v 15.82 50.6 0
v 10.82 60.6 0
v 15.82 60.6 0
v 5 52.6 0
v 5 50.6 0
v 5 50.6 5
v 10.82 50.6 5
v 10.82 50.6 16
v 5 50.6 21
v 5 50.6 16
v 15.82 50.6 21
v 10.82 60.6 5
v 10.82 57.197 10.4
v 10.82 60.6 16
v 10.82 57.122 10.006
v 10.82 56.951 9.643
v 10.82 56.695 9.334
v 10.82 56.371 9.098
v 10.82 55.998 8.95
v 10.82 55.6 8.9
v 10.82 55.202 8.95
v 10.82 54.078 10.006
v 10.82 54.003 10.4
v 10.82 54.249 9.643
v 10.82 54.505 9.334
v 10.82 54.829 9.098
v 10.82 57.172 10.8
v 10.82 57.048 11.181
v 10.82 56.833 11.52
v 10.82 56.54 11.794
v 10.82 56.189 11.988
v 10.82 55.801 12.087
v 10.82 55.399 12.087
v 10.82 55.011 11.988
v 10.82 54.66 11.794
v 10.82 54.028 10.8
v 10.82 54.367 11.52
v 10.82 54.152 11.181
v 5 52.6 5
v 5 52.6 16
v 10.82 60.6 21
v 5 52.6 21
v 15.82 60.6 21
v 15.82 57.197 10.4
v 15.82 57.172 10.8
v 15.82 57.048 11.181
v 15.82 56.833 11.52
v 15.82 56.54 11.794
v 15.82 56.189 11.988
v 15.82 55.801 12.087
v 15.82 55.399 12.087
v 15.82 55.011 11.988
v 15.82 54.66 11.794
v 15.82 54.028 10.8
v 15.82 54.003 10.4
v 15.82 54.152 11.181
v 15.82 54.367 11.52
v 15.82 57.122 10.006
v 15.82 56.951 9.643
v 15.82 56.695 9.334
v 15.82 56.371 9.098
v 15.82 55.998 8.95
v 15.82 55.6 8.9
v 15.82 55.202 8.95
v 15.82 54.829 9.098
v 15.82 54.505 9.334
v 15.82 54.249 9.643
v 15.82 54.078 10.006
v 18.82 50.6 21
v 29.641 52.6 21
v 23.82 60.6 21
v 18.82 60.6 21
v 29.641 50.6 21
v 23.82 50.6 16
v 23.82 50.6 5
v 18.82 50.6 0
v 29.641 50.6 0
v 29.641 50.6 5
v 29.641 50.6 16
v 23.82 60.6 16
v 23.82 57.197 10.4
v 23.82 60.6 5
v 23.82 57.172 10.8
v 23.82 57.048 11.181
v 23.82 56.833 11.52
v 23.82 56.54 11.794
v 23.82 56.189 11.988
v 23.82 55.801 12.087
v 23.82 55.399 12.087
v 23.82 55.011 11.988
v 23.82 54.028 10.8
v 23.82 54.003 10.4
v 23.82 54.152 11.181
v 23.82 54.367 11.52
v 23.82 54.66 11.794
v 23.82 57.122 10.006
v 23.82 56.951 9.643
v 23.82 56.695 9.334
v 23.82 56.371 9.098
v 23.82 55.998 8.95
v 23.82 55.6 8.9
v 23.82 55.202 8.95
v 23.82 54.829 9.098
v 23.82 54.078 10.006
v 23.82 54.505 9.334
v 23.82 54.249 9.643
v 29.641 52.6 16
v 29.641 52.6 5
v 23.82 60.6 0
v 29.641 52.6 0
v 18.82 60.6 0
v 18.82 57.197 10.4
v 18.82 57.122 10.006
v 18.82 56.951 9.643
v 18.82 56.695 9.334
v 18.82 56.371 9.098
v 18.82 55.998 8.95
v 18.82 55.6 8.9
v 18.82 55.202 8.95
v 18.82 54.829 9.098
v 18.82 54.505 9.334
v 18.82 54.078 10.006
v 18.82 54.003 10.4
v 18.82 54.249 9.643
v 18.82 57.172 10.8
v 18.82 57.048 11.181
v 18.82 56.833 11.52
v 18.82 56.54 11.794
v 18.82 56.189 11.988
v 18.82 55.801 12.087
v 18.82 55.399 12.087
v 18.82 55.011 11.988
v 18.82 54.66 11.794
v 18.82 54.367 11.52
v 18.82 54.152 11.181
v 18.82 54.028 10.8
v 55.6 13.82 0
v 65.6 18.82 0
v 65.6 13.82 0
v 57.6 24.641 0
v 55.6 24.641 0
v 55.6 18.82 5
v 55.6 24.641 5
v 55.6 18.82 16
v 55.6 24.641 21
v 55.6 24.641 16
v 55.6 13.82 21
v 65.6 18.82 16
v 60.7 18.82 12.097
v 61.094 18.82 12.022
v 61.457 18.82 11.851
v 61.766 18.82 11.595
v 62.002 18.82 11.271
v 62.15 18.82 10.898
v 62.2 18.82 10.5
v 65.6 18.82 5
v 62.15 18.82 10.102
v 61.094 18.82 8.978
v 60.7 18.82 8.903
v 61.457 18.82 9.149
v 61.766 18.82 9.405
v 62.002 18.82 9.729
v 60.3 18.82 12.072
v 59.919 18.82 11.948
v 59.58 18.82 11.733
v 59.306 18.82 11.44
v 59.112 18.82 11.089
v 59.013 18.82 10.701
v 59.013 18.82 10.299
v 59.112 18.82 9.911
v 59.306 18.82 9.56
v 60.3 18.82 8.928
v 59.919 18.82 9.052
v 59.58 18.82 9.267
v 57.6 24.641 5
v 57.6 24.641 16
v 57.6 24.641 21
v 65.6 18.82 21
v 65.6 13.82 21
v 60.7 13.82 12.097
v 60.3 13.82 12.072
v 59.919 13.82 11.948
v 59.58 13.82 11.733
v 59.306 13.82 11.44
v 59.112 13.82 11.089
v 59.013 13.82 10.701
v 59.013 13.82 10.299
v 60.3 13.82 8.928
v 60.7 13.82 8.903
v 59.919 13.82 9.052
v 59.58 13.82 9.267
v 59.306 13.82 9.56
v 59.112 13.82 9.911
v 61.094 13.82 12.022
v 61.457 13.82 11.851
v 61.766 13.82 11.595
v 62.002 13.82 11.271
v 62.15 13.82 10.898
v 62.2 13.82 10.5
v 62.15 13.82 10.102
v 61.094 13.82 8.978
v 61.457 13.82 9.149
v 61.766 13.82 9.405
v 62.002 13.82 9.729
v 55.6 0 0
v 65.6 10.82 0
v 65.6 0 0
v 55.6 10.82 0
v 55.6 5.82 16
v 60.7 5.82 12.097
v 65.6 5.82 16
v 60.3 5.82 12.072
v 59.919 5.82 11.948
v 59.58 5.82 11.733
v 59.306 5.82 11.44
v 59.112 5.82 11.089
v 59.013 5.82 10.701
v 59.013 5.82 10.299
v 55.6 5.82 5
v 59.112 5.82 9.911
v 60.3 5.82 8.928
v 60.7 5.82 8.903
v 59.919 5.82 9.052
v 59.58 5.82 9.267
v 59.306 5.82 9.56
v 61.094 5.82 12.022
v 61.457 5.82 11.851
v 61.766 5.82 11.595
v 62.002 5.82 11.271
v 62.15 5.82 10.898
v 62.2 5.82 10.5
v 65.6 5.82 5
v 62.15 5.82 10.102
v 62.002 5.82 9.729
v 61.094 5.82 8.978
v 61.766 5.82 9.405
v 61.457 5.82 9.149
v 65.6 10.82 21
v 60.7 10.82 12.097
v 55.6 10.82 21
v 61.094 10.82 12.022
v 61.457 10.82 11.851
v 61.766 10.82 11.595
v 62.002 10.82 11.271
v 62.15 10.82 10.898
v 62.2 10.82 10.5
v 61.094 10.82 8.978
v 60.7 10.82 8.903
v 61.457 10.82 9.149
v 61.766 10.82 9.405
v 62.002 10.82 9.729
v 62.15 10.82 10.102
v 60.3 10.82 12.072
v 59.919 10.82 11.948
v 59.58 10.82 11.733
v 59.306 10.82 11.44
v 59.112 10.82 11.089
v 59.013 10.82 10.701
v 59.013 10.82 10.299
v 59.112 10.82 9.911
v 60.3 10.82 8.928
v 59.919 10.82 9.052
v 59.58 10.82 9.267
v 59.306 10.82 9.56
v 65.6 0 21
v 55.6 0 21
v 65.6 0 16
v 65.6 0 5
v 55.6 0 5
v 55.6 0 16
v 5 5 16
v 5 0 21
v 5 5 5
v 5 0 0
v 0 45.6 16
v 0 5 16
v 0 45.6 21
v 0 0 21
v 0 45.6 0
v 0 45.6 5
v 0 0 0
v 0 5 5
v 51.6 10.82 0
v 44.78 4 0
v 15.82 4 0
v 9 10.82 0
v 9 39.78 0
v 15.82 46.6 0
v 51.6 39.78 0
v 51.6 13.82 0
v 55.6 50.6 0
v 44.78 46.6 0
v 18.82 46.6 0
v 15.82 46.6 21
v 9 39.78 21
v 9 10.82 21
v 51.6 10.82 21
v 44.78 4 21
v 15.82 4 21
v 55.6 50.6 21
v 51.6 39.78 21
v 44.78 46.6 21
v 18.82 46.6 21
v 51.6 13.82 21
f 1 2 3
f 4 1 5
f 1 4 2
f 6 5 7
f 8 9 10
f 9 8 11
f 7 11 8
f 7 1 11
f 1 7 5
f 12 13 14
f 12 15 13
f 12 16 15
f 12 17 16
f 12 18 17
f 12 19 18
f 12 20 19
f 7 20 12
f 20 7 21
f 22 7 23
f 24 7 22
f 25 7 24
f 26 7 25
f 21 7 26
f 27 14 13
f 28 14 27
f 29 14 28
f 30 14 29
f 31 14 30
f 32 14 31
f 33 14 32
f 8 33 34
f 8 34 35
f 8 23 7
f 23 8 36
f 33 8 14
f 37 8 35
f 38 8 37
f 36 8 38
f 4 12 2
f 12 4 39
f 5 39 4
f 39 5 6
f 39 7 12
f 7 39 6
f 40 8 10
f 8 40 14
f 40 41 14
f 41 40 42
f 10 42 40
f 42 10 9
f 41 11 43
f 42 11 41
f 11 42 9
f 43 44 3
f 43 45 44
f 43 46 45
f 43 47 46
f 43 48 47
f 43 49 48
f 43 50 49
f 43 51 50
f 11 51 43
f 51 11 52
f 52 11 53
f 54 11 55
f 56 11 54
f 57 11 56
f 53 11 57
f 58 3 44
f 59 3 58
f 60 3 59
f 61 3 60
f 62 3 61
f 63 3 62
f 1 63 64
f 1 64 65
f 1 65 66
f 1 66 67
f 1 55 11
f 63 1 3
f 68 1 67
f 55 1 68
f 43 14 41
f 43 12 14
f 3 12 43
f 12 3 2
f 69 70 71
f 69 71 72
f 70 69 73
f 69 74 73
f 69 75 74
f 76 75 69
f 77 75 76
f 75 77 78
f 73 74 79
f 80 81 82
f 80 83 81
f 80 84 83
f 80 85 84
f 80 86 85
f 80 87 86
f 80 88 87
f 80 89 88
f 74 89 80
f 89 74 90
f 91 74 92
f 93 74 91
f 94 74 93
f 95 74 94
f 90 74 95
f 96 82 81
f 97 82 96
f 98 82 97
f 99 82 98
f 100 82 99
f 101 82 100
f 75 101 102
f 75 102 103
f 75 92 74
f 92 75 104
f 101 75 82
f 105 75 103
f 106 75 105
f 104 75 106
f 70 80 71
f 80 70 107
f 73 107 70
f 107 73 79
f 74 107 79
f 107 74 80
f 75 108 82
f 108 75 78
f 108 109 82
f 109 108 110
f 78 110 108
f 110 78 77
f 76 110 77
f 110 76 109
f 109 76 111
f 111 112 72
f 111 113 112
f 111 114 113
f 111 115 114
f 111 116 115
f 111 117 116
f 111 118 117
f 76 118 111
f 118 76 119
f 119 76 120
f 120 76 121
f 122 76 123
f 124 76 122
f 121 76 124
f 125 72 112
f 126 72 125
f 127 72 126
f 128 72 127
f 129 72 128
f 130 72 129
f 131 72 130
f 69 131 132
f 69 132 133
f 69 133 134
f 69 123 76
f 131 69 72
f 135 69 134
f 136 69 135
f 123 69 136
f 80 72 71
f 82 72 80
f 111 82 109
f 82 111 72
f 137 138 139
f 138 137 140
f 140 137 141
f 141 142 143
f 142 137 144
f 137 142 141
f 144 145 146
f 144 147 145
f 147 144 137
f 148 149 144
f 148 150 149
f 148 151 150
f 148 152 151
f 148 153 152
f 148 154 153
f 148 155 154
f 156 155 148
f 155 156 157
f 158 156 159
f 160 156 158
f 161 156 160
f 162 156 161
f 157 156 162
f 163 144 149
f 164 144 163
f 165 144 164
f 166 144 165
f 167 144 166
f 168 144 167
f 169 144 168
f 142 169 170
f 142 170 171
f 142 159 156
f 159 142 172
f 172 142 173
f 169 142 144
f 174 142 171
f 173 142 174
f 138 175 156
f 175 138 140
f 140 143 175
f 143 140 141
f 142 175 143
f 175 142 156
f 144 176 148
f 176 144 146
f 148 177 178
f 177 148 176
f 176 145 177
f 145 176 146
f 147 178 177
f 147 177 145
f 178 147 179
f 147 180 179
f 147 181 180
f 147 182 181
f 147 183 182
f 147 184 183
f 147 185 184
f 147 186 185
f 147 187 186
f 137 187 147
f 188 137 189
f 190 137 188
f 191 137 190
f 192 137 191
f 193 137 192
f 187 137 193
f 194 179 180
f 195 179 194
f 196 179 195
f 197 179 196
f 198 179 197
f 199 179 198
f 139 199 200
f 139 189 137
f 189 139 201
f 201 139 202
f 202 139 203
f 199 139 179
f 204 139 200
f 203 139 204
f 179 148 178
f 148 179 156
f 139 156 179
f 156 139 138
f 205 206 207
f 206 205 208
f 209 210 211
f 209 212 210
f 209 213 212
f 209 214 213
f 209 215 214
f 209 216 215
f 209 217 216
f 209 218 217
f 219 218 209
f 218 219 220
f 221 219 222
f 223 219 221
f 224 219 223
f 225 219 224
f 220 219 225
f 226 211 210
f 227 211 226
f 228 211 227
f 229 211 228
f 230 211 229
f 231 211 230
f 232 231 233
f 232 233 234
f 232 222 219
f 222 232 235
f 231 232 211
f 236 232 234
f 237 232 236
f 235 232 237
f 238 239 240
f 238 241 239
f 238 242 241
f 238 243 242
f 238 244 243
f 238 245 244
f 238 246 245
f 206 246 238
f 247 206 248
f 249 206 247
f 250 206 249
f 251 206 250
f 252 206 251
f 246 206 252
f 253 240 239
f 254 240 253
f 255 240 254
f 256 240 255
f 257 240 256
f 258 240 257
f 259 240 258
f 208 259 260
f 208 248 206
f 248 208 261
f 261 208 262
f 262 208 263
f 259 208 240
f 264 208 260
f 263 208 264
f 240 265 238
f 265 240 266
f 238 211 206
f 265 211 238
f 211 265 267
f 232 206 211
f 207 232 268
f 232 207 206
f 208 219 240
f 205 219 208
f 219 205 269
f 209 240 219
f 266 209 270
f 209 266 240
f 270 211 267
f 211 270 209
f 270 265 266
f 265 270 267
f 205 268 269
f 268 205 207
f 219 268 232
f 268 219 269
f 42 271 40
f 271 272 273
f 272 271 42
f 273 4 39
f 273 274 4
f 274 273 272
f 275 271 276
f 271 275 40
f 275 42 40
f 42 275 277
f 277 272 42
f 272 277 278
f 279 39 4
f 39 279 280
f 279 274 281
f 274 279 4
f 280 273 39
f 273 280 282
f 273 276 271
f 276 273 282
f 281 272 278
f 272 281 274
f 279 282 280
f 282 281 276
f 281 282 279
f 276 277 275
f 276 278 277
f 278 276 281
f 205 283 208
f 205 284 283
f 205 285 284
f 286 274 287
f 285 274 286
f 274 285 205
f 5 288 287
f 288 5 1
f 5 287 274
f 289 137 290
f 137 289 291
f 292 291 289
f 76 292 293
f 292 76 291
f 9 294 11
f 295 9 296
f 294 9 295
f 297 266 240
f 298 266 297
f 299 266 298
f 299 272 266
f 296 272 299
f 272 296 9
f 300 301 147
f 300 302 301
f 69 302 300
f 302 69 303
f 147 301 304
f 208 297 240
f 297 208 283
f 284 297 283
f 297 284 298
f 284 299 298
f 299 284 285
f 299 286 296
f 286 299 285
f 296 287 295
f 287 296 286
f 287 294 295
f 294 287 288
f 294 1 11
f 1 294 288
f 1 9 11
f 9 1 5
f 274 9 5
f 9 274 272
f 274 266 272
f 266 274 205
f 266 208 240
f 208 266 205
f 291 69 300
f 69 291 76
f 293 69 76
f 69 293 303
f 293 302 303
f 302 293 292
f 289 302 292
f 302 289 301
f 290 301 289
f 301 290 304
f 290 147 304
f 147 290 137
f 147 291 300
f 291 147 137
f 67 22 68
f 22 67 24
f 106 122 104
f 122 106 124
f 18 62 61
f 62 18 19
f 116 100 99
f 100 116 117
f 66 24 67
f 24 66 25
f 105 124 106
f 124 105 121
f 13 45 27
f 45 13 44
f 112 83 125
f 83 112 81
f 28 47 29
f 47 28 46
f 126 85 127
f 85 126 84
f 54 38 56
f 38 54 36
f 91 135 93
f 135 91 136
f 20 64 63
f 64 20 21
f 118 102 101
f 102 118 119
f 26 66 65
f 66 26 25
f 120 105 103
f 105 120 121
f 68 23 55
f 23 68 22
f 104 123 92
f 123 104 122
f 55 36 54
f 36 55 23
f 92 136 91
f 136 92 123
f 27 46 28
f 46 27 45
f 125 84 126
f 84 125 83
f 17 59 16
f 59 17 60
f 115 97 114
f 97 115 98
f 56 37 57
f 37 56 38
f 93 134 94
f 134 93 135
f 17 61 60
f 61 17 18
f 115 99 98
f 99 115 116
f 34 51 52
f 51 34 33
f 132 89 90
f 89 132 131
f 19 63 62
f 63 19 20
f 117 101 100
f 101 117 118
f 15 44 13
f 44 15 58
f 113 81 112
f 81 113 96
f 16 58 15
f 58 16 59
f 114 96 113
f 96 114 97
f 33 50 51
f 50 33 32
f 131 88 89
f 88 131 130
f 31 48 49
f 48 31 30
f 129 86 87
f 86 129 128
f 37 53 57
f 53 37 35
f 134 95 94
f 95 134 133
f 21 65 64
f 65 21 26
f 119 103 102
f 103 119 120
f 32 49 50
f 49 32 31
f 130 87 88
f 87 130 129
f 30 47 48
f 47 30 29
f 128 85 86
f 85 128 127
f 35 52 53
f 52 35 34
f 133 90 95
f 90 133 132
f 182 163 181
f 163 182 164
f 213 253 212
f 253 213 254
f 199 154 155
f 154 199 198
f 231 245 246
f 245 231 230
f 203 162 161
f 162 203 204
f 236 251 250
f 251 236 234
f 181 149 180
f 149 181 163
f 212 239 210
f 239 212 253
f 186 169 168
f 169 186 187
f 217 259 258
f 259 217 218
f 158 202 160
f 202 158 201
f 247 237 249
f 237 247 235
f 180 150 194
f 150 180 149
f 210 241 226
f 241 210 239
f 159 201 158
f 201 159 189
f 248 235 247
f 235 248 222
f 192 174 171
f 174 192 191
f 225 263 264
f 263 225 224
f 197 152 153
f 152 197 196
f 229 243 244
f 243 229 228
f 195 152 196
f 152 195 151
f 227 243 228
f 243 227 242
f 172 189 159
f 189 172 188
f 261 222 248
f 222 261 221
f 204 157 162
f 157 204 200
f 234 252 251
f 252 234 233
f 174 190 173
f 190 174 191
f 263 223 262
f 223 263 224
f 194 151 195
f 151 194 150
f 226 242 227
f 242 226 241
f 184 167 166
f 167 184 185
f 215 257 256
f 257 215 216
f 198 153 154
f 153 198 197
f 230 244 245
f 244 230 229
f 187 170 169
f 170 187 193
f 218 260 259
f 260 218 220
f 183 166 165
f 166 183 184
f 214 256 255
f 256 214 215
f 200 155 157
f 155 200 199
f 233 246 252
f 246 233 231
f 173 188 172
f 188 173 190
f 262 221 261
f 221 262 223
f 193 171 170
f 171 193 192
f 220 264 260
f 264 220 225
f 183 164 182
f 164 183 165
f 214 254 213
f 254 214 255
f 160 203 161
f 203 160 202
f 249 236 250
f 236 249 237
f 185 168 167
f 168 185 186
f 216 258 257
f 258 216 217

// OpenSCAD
// Holder type
motorHolderType = "corner"; // [simple, corner, half]
// Distance between motor sides
motorSize = 42.6;
// Distance between motor corners
motorEdge = 50.6;
// Wall thickness
gripWidth = 8;
// Holder width
gripHeight = 21;
// Distance between holder arm's
gripHole = 3; // [0.1:0.1:10]
backstayScrewThickness = 5;
backstayScrewHeight = 10;
backstayBaseThickness = 5;
backstayBaseHeight = 5;
backstayBaseLength = 52.6;
backstayBaseSlopeLength = 7;
backstayBaseSlopeHeight = 0;
// Screw hole's diameter
screwHoleDiameter = 3.2;
// Screw hole's definition
$fn=25;

function cornerSize(size1, size2) = sqrt(2*pow((((sqrt(2)*size1)-size2)/2),2));

module motorHolderShape(
    motorHolderType="simple",
    motorSize=42.2,
    motorEdge=50.2,
    gripWidth=5,
    gripHeight=21,
    gripHole=15
) {
    corner = cornerSize(motorSize, motorEdge);
    linear_extrude(height=gripHeight)
        difference() {
            square(size=motorSize+gripWidth, center=true);
            intersection() {
                square(size=motorSize, center=true);
                translate([0, 0])
                    rotate([0, 0, 45])
                        square(size=motorEdge, center=true);
            }
            if (motorHolderType=="corner") {
                translate([corner+(gripWidth/2), corner+(gripWidth/2)])
                    difference() {
                        square(size=motorSize+gripWidth, center=true);
                        square(size=motorSize+gripWidth-(2*gripHole), center=true);
                    }
            } else if (motorHolderType=="simple") {
                translate([0, motorSize/2])
                    square(size=[gripHole, motorEdge], center=true);
            } else {
                translate([0, 0])
                    square(size=[motorEdge, gripHole], center=true);
            }
        }
}

module slope(
    thickness=5,
    height=25,
    length=7,
    endHeight=5
) {
    points =  [
        [0, 0, 0],
        [thickness, 0, 0],
        [thickness, 0, length],
        [0, 0, length],
        [0, height, 0],
        [thickness, height, 0],
        [thickness, endHeight, length],
        [0, endHeight, length]
    ];

    faces = endHeight>0 ? [
        [2, 1, 0],
        [3, 2, 0],
        [1, 5, 4],
        [0, 1, 4],
        [5, 6, 7],
        [4, 5, 7],
        [2, 6, 5],
        [1, 2, 5],
        [3, 7, 6],
        [2, 3, 6],
        [0, 4, 7],
        [3, 0, 7]
    ] : [
        [2, 1, 0],
        [3, 2, 0],
        [1, 5, 4],
        [0, 1, 4],
        [5, 6, 7],
        [4, 5, 7],
        [4, 3, 0],
        [5, 1, 2]
    ];

    polyhedron(points = points, faces  = faces);
}

module backstay(
    thickness=5,
    width=42.2,
    height=25,
    length=20,
    slopeLength=7,
    slopeHeight=5
) {
    union() {
        cube(size=[width, height, thickness]);

        cube(size=[thickness, height, length-slopeLength]);

        translate([width-thickness, 0, 0])
            cube(size=[thickness, height, length-slopeLength]);

        if (slopeLength>0) {
            translate([0, 0, length-slopeLength])
                slope(
                    thickness=thickness,
                    height=height,
                    length=slopeLength,
                    endHeight=slopeHeight
               );

            translate([width-thickness, 0, length-slopeLength])
                slope(
                    thickness=thickness,
                    height=height,
                    length=slopeLength,
                    endHeight=slopeHeight
               );
        }
    }
}

module simpleSupports(
    motorSize = 42.6,
    motorEdge = 50.6,
    gripWidth = 8,
    gripHeight = 21,
    gripHole = 5,
    backstayScrewThickness = 5,
    backstayScrewHeight = 10,
    backstayBaseThickness = 5,
    backstayBaseHeight = 5,
    backstayBaseLength = 52.6,
    backstayBaseSlopeLength = 7,
    backstayBaseSlopeHeight = 0,
    screwHoleDiameter = 3.2,
) {
    corner = cornerSize(motorSize, motorEdge);

    rotate([0, 270, 0])
        translate([0, (motorSize+gripWidth)/2, gripHole/2])
            backstay(
                thickness=backstayScrewThickness,
                width=gripHeight,
                height=backstayScrewHeight,
                length=corner+(gripWidth/2),
                slopeLength=corner+(gripWidth/2)-backstayScrewThickness,
                slopeHeight=2
            );

    rotate([0, 90, 0])
        translate([-gripHeight, (motorSize+gripWidth)/2, gripHole/2])
            backstay(
                thickness=backstayScrewThickness,
                width=gripHeight,
                height=backstayScrewHeight,
                length=corner+(gripWidth/2),
                slopeLength=corner+(gripWidth/2)-backstayScrewThickness,
                slopeHeight=2
            );

    rotate([180, 90, 0])
        translate([-gripHeight, (motorSize+gripWidth)/2, -(motorSize+gripWidth)/2])
            backstay(
                thickness=backstayBaseThickness,
                width=gripHeight,
                height=backstayBaseHeight,
                length=backstayBaseLength,
                slopeLength=backstayBaseSlopeLength,
                slopeHeight=backstayBaseSlopeHeight
            );
}

module cornerSupports(
    motorSize = 42.6,
    motorEdge = 50.6,
    gripWidth = 8,
    gripHeight = 21,
    gripHole = 5,
    backstayScrewThickness = 5,
    backstayScrewHeight = 10,
    backstayBaseThickness = 5,
    backstayBaseHeight = 5,
    backstayBaseLength = 35,
    backstayBaseSlopeLength = 10,
    backstayBaseSlopeHeight = 2,
    screwHoleDiameter = 3.2,
) {
    corner = cornerSize(motorSize, motorEdge);

    rotate([0, 270, 0])
        translate([0, (motorSize+gripWidth)/2, (motorSize/2)-corner])
            backstay(
                thickness=backstayScrewThickness,
                width=gripHeight,
                height=backstayScrewHeight,
                length=corner+(gripWidth/2),
                slopeLength=corner+(gripWidth/2)-backstayScrewThickness,
                slopeHeight=2
            );

    rotate([0, 90, 0])
        translate([-gripHeight, (motorSize+gripWidth)/2, corner+gripHole-motorSize/2])
            backstay(
                thickness=backstayScrewThickness,
                width=gripHeight,
                height=backstayScrewHeight,
                length=corner+(gripWidth/2),
                slopeLength=corner+(gripWidth/2)-backstayScrewThickness,
                slopeHeight=2
            );

    rotate([0, 270, 270])
        translate([0, (motorSize+gripWidth)/2, corner+gripHole-motorSize/2])
            backstay(
                thickness=backstayScrewThickness,
                width=gripHeight,
                height=backstayScrewHeight,
                length=corner+(gripWidth/2),
                slopeLength=corner+(gripWidth/2)-backstayScrewThickness,
                slopeHeight=2
            );

    rotate([0, 90, 270])
        translate([-gripHeight, (motorSize+gripWidth)/2, (motorSize/2)-corner])
            backstay(
                thickness=backstayScrewThickness,
                width=gripHeight,
                height=backstayScrewHeight,
                length=corner+(gripWidth/2),
                slopeLength=0,
                slopeHeight=2
            );

    rotate([270, 90, 0])
        translate([-gripHeight, (motorSize+gripWidth)/2, -(motorSize+gripWidth)/2])
            backstay(
                thickness=backstayBaseThickness,
                width=gripHeight,
                height=backstayBaseHeight,
                length=backstayBaseLength,
                slopeLength=backstayBaseSlopeLength,
                slopeHeight=backstayBaseSlopeHeight
            );

}

module halfSupports(
    motorSize = 42.6,
    motorEdge = 50.6,
    gripWidth = 8,
    gripHeight = 21,
    gripHole = 5,
    backstayScrewThickness = 5,
    backstayScrewHeight = 10,
    backstayBaseThickness = 5,
    backstayBaseHeight = 5,
    backstayBaseLength = 35,
    backstayBaseSlopeLength = 10,
    backstayBaseSlopeHeight = 2,
    screwHoleDiameter = 3.2,
) {
    corner = cornerSize(motorSize, motorEdge);

    rotate([90, 270, 0])
        translate([0, (motorSize+gripWidth)/2, gripHole/2])
            backstay(
                thickness=backstayScrewThickness,
                width=gripHeight,
                height=backstayScrewHeight,
                length=corner+(gripWidth/2),
                slopeLength=corner+(gripWidth/2)-backstayScrewThickness,
                slopeHeight=2
            );

    rotate([-90, 90, 0])
        translate([-gripHeight, (motorSize+gripWidth)/2, gripHole/2])
            backstay(
                thickness=backstayScrewThickness,
                width=gripHeight,
                height=backstayScrewHeight,
                length=corner+(gripWidth/2),
                slopeLength=corner+(gripWidth/2)-backstayScrewThickness,
                slopeHeight=2
            );

    rotate([0, 270, 270])
        translate([0, (motorSize+gripWidth)/2, gripHole/2])
            backstay(
                thickness=backstayScrewThickness,
                width=gripHeight,
                height=backstayScrewHeight,
                length=corner+(gripWidth/2),
                slopeLength=corner+(gripWidth/2)-backstayScrewThickness,
                slopeHeight=2
            );

    rotate([0, 90, 270])
        translate([-gripHeight, (motorSize+gripWidth)/2, gripHole/2])
            backstay(
                thickness=backstayScrewThickness,
                width=gripHeight,
                height=backstayScrewHeight,
                length=corner+(gripWidth/2),
                slopeLength=corner+(gripWidth/2)-backstayScrewThickness,
                slopeHeight=2
            );

}

module screwHoles(
    motorHolderType = "simple",
    motorSize = 42.6,
    gripWidth = 8,
    gripHeight = 21,
    backstayScrewHeight = 10,
    screwHoleDiameter = 3.2,
) {
    difference() {
        children();

        rotate([0, 90, 0])
            translate([
                -gripHeight/2,
                (motorSize+gripWidth+backstayScrewHeight)/2,
                -(gripHeight+gripWidth)
            ])
                cylinder(d=screwHoleDiameter, h=motorSize);

        rotate([90, 0, 0])
            translate([
                (motorSize+gripWidth+backstayScrewHeight)/2,
                gripHeight/2,
                -motorSize/2
            ])
                cylinder(d=screwHoleDiameter, h=motorSize);

        if (motorHolderType == "half") {
            rotate([90, 0, 0])
                translate([
                    -(motorSize+gripWidth+backstayScrewHeight)/2,
                    gripHeight/2,
                    -motorSize/2
                ])
                    cylinder(d=screwHoleDiameter, h=motorSize);
        }
    }
}

module centerCoords(
    motorHolderType = "simple",
    motorSize = 42.6,
    gripWidth = 8,
    gripHeight = 21,
    backstayScrewHeight = 10,
    backstayBaseHeight = 5,
    backstayBaseLength = 35,
    backstayBaseSlopeHeight = 2,
    center = false
) {
    if (motorHolderType == "simple") {
        let(extraLeft = max(0, (backstayBaseLength-(motorSize+gripWidth)))) {
            if (center == true) {
                translate([
                    extraLeft/2,
                    (max(backstayBaseHeight,backstayBaseSlopeHeight)-backstayScrewHeight)/2,
                    -gripHeight/2
                ])
                    children();
            } else {
                translate([
                    ((motorSize+gripWidth)/2)+extraLeft,
                    ((motorSize+gripWidth)/2)+backstayBaseHeight,
                    0
                ])
                    children();
            }
        }
    } else if (motorHolderType == "corner") {
        if (center == true) {
            translate([
                (max(backstayBaseHeight, backstayBaseSlopeHeight)-backstayScrewHeight)/2,
                -backstayScrewHeight/2,
                -gripHeight/2
            ])
                children();
        } else {
            translate([
                ((motorSize+gripWidth)/2)+backstayBaseHeight,
                (motorSize+gripWidth)/2,
                0
            ])
                children();
        }
    } else if (motorHolderType == "half") {
        if (center == true) {
            translate([0, 0, -gripHeight/2])
                children();
        } else {
            translate([
                (motorSize+gripWidth)/2+backstayScrewHeight,
                (motorSize+gripWidth)/2,
                0
            ])
                children();
        }
    } else {
        children();
    }
}

module motorHolder(
    motorHolderType = "simple",
    motorSize = 42.6,
    motorEdge = 50.6,
    gripWidth = 8,
    gripHeight = 21,
    gripHole = 5,
    backstayScrewThickness = 5,
    backstayScrewHeight = 10,
    backstayBaseThickness = 5,
    backstayBaseHeight = 5,
    backstayBaseLength = 35,
    backstayBaseSlopeLength = 10,
    backstayBaseSlopeHeight = 2,
    screwHoleDiameter = 3.2,
    center = false
) {
    centerCoords(
        motorHolderType = motorHolderType,
        motorSize = motorSize,
        gripWidth = gripWidth,
        gripHeight = gripHeight,
        backstayScrewHeight = backstayScrewHeight,
        backstayBaseHeight = backstayBaseHeight,
        backstayBaseLength = backstayBaseLength,
        backstayBaseSlopeHeight = backstayBaseSlopeHeight,
        center = center
    ) {
        screwHoles(
            motorHolderType = motorHolderType,
            motorSize = motorSize,
            gripWidth = gripWidth,
            gripHeight = gripHeight,
            backstayScrewHeight = backstayScrewHeight,
            screwHoleDiameter = screwHoleDiameter
        ) {
            union () {
                motorHolderShape(
                    motorHolderType = motorHolderType,
                    motorSize = motorSize,
                    motorEdge = motorEdge,
                    gripWidth = gripWidth,
                    gripHeight = gripHeight,
                    gripHole = gripHole
                );

                if (motorHolderType == "simple") {
                    simpleSupports(
                        motorSize = motorSize,
                        motorEdge = motorEdge,
                        gripWidth = gripWidth,
                        gripHeight = gripHeight,
                        gripHole = gripHole,
                        backstayScrewThickness = backstayScrewThickness,
                        backstayScrewHeight = backstayScrewHeight,
                        backstayBaseThickness = backstayBaseThickness,
                        backstayBaseHeight = backstayBaseHeight,
                        backstayBaseLength = backstayBaseLength,
                        backstayBaseSlopeLength = backstayBaseSlopeLength,
                        backstayBaseSlopeHeight = backstayBaseSlopeHeight,
                        screwHoleDiameter = screwHoleDiameter
                    );
                } else if (motorHolderType == "corner") {
                    cornerSupports(
                        motorHolderType = motorHolderType,
                        motorSize = motorSize,
                        motorEdge = motorEdge,
                        gripWidth = gripWidth,
                        gripHeight = gripHeight,
                        gripHole = gripHole,
                        backstayScrewThickness = backstayScrewThickness,
                        backstayScrewHeight = backstayScrewHeight,
                        backstayBaseThickness = backstayBaseThickness,
                        backstayBaseHeight = backstayBaseHeight,
                        backstayBaseLength = backstayBaseLength,
                        backstayBaseSlopeLength = backstayBaseSlopeLength,
                        backstayBaseSlopeHeight = backstayBaseSlopeHeight,
                        screwHoleDiameter = screwHoleDiameter
                    );
                } else if (motorHolderType == "half") {
                    halfSupports(
                        motorHolderType = motorHolderType,
                        motorSize = motorSize,
                        motorEdge = motorEdge,
                        gripWidth = gripWidth,
                        gripHeight = gripHeight,
                        gripHole = gripHole,
                        backstayScrewThickness = backstayScrewThickness,
                        backstayScrewHeight = backstayScrewHeight,
                        backstayBaseThickness = backstayBaseThickness,
                        backstayBaseHeight = backstayBaseHeight,
                        backstayBaseLength = backstayBaseLength,
                        backstayBaseSlopeLength = backstayBaseSlopeLength,
                        backstayBaseSlopeHeight = backstayBaseSlopeHeight,
                        screwHoleDiameter = screwHoleDiameter
                    );
                }
            }
        }
    }
}

motorHolder(
    motorHolderType = motorHolderType,
    motorSize = motorSize,
    motorEdge = motorEdge,
    gripWidth = gripWidth,
    gripHeight = gripHeight,
    gripHole = gripHole,
    backstayScrewThickness = backstayScrewThickness,
    backstayScrewHeight = backstayScrewHeight,
    backstayBaseThickness = backstayBaseThickness,
    backstayBaseHeight = backstayBaseHeight,
    backstayBaseLength = backstayBaseLength,
    backstayBaseSlopeLength = backstayBaseSlopeLength,
    backstayBaseSlopeHeight = backstayBaseSlopeHeight,
    screwHoleDiameter = screwHoleDiameter,
    center = false
);
